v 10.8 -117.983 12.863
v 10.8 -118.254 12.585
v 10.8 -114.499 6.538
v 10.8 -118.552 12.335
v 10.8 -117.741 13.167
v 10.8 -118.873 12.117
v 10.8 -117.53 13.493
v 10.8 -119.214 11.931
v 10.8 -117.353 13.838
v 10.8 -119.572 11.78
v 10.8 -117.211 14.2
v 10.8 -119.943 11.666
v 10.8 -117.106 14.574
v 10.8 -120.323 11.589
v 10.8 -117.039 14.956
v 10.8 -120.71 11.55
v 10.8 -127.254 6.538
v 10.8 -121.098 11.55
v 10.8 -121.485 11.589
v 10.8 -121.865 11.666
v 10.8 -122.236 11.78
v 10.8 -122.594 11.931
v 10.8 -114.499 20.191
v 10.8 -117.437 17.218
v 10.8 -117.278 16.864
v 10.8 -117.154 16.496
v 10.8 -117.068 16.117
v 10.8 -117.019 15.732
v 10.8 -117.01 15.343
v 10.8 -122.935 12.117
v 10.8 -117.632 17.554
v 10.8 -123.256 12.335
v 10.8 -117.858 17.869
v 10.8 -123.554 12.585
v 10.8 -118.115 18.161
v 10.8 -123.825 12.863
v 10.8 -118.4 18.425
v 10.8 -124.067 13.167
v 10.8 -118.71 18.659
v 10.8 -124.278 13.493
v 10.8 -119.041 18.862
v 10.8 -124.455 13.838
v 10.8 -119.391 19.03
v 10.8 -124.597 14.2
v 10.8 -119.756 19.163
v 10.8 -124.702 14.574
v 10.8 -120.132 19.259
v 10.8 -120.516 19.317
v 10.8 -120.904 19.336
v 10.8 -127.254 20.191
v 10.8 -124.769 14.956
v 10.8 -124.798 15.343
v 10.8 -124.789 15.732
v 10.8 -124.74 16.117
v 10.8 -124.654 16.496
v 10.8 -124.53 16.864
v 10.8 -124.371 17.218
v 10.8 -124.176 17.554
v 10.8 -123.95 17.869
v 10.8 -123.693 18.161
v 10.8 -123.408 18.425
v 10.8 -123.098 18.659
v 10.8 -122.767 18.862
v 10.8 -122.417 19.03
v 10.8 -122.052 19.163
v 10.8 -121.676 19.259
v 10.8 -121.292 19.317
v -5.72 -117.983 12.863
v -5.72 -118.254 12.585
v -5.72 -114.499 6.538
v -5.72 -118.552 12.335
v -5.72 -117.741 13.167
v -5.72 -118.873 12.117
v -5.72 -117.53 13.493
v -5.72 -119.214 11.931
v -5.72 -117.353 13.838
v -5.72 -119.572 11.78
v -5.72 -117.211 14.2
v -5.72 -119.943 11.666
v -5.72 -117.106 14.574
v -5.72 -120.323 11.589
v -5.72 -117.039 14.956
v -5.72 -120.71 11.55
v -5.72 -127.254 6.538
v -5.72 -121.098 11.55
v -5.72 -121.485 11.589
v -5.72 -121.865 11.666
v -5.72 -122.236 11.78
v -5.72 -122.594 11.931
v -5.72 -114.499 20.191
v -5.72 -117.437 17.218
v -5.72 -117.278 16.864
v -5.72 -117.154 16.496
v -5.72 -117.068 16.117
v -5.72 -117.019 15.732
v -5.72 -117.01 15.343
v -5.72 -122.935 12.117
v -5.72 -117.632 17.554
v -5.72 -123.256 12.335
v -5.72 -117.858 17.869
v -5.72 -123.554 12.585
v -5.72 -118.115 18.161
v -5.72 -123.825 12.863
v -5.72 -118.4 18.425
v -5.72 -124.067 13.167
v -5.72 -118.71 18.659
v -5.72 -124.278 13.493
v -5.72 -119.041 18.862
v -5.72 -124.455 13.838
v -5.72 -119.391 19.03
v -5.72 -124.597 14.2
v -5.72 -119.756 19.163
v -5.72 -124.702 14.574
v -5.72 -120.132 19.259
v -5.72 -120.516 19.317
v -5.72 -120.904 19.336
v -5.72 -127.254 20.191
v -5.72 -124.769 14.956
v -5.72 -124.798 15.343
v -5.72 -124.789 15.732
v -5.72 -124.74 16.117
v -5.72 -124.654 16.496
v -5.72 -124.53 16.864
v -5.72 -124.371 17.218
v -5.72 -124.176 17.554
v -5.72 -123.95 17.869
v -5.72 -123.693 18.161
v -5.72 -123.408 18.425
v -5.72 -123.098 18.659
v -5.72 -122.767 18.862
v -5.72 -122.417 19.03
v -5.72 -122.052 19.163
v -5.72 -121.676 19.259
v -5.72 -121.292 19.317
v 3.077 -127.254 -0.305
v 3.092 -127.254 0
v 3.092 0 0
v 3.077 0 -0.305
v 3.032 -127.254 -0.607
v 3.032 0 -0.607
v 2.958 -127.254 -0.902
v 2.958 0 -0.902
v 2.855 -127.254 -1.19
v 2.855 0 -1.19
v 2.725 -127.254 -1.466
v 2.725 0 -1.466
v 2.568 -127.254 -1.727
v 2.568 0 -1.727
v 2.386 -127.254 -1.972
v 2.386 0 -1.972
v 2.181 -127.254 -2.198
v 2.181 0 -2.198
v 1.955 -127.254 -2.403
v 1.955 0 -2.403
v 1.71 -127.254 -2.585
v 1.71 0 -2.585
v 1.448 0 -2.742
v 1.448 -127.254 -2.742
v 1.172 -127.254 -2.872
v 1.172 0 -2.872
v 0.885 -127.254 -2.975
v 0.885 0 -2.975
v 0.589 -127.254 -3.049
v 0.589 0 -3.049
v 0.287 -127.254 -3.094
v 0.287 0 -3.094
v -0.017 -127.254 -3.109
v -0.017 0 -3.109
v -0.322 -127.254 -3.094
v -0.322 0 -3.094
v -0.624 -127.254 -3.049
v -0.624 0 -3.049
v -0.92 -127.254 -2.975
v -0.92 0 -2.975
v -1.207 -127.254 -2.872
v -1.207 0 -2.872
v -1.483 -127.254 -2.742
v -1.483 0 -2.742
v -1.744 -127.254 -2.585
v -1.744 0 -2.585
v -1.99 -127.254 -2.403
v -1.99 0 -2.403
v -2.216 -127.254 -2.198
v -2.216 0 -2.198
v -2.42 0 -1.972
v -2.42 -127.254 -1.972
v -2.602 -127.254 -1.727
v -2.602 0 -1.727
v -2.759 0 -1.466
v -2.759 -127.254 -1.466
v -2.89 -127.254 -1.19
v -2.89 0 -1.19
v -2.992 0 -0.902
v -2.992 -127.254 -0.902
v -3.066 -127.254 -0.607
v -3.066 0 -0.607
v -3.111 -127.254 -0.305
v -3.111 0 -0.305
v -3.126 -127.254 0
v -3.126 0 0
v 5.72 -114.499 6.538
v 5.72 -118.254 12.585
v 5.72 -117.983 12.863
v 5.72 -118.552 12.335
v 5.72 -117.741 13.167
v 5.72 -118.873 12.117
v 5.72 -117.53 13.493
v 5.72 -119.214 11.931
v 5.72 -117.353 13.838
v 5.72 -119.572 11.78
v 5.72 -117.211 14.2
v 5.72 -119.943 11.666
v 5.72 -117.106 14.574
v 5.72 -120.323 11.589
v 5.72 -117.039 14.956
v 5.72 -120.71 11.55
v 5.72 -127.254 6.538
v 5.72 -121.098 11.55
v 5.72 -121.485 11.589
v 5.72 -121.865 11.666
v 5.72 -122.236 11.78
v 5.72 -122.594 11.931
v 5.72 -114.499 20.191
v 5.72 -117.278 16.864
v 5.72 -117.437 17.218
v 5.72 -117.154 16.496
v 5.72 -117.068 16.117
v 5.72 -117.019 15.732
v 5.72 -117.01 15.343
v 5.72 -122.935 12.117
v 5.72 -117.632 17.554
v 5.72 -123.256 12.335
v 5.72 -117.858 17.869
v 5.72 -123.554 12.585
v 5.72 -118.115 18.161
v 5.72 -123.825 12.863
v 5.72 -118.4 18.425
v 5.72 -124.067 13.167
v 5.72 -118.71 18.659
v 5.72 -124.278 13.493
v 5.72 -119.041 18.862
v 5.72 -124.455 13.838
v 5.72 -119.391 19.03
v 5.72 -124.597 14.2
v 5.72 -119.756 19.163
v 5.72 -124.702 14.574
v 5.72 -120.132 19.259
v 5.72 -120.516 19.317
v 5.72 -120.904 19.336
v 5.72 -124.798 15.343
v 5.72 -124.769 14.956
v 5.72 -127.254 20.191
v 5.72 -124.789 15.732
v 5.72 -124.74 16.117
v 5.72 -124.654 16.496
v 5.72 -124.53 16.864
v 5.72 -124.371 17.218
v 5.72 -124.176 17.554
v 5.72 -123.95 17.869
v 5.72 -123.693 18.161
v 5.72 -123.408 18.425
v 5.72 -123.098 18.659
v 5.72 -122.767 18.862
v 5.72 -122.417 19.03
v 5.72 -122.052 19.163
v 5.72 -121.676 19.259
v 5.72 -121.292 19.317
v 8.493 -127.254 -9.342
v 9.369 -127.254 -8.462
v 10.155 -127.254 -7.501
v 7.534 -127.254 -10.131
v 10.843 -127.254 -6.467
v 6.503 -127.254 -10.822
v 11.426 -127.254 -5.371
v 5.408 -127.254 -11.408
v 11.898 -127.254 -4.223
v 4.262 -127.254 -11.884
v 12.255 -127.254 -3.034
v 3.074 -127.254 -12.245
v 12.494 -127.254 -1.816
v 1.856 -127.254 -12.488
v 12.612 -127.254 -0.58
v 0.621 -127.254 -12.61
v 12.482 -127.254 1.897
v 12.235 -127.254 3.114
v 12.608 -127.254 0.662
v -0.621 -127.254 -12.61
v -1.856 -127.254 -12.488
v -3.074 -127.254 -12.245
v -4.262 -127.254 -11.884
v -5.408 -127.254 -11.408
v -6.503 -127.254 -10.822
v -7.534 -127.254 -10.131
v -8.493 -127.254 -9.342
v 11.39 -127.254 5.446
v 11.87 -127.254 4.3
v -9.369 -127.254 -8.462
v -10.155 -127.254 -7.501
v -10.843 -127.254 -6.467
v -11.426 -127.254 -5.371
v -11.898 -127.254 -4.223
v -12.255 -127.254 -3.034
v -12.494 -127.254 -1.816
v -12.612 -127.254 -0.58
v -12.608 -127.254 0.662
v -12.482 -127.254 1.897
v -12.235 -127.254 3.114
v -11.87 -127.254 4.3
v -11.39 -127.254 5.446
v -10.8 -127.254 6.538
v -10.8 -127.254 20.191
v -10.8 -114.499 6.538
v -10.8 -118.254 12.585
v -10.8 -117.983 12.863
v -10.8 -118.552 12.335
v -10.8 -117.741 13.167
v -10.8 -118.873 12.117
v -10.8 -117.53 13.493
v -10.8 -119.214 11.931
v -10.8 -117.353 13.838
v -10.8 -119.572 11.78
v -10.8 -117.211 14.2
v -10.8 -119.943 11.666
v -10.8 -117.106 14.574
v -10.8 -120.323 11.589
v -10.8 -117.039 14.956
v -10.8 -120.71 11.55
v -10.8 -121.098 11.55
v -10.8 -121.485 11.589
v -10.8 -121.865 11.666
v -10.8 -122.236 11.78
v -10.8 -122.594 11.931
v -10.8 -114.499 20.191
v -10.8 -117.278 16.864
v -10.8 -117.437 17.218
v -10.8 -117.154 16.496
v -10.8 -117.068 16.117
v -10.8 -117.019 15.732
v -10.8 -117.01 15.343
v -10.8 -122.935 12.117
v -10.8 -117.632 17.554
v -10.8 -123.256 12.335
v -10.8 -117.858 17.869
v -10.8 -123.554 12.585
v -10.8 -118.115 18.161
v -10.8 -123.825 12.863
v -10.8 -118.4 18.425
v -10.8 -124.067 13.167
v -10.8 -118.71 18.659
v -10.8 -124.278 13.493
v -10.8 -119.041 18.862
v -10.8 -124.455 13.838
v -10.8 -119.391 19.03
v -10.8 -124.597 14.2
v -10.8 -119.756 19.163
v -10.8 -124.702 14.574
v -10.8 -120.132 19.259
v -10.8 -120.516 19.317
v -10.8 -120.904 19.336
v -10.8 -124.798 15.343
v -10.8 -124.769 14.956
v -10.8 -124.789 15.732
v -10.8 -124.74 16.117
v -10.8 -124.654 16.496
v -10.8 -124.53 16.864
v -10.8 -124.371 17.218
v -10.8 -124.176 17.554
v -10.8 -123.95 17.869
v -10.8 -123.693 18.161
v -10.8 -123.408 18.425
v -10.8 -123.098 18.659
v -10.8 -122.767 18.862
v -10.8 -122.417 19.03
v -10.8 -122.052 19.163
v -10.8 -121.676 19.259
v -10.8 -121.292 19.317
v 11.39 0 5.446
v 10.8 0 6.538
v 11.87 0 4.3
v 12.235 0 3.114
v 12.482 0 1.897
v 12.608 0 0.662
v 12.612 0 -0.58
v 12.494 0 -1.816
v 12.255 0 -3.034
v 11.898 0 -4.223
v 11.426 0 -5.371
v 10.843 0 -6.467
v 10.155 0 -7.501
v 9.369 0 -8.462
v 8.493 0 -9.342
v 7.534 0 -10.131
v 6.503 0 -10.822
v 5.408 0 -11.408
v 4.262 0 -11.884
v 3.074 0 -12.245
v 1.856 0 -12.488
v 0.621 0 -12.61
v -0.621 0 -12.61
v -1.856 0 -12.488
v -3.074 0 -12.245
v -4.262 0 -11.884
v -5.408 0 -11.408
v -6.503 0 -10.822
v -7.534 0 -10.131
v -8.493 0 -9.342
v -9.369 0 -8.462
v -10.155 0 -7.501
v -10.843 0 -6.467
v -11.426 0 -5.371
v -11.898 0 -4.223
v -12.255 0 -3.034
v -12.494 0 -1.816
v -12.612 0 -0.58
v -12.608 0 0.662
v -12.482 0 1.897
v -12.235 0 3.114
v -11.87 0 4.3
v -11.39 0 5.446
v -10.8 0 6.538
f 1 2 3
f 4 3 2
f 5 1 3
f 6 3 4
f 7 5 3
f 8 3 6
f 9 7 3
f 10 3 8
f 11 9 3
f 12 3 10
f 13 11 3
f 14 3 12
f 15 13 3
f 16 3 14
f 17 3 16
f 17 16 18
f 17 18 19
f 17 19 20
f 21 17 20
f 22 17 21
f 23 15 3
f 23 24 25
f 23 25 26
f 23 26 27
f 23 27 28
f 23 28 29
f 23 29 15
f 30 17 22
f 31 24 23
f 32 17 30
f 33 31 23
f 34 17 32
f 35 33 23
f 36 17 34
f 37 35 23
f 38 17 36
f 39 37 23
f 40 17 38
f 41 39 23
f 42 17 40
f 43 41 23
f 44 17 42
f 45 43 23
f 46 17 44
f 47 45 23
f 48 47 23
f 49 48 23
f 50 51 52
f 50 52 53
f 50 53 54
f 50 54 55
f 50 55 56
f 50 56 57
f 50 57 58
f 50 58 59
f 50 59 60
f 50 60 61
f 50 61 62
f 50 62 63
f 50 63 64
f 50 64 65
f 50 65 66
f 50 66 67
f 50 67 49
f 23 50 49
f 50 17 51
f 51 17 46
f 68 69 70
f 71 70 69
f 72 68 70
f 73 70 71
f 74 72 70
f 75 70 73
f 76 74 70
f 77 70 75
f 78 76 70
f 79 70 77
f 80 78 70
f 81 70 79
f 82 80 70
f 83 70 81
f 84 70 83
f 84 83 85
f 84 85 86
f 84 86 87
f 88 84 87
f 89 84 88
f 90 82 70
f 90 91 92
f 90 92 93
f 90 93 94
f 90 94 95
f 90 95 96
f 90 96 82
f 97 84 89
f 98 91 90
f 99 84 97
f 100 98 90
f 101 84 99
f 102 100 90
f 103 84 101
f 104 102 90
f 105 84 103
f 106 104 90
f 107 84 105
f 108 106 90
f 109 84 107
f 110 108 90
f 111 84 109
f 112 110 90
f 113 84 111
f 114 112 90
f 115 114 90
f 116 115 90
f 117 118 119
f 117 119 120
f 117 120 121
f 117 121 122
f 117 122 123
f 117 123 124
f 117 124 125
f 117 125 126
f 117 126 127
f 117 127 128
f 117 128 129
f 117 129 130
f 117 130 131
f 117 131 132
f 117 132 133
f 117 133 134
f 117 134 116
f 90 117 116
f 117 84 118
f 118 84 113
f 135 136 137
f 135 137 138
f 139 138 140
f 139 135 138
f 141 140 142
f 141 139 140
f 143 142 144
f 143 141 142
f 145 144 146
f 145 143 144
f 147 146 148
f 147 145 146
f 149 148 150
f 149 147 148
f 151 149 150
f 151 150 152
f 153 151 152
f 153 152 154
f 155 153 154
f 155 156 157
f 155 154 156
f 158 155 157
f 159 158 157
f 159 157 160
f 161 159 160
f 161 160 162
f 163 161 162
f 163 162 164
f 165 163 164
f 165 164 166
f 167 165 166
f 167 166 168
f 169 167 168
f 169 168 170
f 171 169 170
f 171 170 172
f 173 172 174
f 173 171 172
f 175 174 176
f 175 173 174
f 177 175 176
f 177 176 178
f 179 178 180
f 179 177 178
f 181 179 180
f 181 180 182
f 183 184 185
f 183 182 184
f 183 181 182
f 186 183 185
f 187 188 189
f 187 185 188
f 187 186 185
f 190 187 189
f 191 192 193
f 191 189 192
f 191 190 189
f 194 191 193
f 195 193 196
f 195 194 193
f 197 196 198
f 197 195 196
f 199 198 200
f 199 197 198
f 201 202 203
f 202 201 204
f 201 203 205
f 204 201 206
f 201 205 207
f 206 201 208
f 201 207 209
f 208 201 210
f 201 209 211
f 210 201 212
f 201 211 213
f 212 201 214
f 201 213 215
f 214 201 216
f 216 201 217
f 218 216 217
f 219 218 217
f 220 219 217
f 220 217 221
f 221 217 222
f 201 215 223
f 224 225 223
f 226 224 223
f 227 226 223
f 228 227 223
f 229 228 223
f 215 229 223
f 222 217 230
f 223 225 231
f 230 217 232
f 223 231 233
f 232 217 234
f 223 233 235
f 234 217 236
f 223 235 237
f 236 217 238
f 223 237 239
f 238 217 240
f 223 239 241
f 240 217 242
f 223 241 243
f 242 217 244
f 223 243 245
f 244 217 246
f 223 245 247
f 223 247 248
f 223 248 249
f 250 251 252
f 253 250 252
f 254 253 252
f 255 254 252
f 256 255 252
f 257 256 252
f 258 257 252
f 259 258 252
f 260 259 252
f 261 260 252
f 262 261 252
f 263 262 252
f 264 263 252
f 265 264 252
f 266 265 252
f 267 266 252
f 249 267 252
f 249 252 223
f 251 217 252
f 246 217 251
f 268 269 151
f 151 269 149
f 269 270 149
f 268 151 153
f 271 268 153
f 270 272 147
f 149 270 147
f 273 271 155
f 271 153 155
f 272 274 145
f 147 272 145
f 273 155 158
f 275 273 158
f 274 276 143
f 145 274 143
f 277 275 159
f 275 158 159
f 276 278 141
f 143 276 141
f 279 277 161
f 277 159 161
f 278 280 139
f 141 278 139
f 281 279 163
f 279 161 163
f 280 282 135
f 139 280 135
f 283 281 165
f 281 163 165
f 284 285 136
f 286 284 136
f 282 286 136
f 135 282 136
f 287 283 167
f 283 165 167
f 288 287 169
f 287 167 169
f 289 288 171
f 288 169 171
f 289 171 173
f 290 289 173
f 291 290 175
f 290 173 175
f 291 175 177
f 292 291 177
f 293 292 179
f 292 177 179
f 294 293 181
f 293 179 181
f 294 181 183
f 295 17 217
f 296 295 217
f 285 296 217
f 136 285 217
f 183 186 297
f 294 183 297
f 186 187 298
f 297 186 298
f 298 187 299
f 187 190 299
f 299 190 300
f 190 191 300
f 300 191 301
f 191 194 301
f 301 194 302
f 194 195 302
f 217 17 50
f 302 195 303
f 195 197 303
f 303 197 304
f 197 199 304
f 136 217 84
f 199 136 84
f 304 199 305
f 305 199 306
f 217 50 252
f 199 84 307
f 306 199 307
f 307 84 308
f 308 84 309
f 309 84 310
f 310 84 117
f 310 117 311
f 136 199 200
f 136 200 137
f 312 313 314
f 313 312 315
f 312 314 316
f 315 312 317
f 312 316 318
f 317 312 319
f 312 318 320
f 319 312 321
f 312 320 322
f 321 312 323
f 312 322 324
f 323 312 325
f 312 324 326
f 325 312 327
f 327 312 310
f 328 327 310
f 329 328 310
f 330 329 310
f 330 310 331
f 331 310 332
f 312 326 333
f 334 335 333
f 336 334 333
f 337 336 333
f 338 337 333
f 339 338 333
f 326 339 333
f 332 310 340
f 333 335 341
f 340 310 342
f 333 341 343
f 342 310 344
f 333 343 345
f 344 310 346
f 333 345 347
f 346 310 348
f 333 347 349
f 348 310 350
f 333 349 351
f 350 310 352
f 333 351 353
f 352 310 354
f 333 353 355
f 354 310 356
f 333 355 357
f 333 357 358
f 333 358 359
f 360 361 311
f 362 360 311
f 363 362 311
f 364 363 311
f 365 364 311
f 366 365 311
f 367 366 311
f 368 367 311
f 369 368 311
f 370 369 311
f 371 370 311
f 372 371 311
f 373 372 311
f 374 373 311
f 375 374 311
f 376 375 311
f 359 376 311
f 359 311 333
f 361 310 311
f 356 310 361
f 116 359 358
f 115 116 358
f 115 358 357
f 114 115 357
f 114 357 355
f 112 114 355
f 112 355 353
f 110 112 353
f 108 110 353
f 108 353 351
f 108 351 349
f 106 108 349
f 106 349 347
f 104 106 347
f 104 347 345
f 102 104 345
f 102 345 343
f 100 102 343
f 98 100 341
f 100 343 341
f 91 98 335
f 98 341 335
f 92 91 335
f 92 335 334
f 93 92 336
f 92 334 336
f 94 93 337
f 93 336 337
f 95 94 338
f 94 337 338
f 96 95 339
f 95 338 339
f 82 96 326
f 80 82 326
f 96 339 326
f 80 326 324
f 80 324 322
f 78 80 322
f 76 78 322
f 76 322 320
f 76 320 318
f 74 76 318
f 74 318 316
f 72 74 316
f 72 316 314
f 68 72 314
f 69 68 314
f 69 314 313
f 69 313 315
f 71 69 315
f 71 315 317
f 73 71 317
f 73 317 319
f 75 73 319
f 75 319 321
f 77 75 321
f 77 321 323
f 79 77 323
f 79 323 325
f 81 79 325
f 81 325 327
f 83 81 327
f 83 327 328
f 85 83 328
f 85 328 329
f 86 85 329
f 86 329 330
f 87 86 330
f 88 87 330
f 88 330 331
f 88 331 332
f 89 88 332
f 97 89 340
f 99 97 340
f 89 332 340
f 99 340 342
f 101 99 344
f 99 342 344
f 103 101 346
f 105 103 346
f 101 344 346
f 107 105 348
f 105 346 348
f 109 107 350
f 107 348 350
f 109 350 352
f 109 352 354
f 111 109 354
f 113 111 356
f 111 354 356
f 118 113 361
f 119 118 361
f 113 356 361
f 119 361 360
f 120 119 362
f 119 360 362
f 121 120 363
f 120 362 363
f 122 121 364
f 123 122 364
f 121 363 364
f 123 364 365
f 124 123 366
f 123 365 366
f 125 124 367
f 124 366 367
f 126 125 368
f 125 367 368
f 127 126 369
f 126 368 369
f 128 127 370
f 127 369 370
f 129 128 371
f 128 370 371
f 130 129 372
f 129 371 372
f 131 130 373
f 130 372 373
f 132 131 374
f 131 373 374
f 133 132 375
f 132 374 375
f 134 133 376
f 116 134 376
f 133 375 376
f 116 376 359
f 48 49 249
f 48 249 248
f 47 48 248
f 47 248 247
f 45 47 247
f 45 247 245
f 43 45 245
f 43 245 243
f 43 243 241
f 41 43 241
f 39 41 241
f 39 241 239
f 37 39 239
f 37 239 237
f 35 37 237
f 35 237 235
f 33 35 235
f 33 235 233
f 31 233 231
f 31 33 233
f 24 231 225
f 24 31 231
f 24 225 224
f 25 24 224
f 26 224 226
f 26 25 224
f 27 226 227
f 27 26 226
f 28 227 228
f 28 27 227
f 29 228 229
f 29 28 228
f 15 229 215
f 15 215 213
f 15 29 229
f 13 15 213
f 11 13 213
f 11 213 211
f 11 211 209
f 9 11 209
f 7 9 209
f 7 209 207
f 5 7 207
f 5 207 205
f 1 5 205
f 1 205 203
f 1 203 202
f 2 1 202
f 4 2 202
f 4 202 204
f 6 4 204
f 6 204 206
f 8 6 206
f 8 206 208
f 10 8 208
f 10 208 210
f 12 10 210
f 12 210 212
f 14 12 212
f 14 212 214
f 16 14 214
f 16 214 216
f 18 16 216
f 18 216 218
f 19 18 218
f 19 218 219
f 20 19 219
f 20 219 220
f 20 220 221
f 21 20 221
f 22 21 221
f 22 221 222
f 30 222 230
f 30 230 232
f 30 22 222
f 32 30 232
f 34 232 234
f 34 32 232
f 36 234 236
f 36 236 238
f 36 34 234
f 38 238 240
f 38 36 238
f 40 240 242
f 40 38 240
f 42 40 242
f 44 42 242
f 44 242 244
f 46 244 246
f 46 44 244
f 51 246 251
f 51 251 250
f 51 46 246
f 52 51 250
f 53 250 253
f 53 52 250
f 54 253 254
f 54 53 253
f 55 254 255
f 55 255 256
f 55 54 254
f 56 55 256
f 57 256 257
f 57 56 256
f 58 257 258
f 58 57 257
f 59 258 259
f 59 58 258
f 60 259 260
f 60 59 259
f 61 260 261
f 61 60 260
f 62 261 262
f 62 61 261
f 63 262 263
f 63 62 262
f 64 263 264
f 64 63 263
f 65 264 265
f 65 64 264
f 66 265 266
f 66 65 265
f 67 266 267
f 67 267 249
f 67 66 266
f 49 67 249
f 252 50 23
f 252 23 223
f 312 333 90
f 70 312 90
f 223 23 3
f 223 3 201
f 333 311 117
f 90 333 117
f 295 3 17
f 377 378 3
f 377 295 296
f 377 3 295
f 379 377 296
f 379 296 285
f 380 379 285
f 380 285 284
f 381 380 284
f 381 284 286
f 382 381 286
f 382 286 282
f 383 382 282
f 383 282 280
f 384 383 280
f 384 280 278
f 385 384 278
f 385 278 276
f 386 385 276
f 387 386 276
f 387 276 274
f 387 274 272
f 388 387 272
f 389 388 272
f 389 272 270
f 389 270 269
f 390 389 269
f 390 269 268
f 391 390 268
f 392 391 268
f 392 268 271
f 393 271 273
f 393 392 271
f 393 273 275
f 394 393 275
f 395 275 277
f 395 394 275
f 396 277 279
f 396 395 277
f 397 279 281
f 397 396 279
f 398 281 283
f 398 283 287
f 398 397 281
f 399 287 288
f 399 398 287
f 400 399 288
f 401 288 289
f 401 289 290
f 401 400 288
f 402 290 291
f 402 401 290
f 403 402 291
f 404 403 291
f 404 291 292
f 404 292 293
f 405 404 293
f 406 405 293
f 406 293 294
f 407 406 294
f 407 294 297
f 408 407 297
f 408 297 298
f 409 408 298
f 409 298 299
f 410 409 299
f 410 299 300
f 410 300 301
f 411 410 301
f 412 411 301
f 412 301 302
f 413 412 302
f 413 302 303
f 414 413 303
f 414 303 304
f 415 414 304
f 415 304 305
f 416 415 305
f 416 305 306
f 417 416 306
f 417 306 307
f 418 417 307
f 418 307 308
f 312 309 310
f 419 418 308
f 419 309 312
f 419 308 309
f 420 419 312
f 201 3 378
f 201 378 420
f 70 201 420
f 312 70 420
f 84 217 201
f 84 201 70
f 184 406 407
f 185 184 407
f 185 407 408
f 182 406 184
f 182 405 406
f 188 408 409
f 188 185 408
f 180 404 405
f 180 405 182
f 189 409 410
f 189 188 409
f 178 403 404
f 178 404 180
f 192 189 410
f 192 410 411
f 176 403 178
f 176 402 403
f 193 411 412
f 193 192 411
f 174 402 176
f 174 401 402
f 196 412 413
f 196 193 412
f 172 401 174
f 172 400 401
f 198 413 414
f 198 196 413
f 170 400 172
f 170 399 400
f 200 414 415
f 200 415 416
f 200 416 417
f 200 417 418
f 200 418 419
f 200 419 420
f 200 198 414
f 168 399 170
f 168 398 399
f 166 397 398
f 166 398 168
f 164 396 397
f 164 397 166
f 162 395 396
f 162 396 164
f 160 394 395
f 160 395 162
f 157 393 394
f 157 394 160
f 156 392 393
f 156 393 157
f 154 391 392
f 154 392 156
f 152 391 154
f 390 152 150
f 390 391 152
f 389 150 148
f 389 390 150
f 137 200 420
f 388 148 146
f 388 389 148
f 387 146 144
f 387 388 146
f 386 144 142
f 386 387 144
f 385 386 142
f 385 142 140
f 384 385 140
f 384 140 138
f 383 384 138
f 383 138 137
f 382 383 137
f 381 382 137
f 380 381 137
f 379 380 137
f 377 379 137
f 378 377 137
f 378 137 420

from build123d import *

# Parameters (mm, degrees)
SKETCH1_R           = 12.62515314
BOSS_EXTRUDE1_DEPTH = 127.254
SKETCH2_W           = 21.600890372
SKETCH2_H           = 6.08719661
CUT_EXTRUDE1_DEPTH  = 155.702
CUT_EXTRUDE2_DEPTH  = 141.081655767
SKETCH4_W           = 5.08
SKETCH4_H           = 13.653478909
BOSS_EXTRUDE2_DEPTH = 12.755190121
CUT_EXTRUDE3_REACH  = 132.958
SKETCH15_R          = 3.895516075


with BuildPart() as part:
    # Sketch1 → Boss-Extrude1 (new body)
    with BuildSketch(Plane(origin=(0, 0, 0), x_dir=(1, 0, 0), z_dir=(0, 1, 0))):
        with Locations(Location((0, 0, 0), (0, 0, 270))):
            Circle(SKETCH1_R)
    extrude(amount=-BOSS_EXTRUDE1_DEPTH)

    # Sketch2 → Cut-Extrude1 (cut)
    with BuildSketch(Plane(origin=(0, -127.254, 0), x_dir=(-1, 0, 0), z_dir=(0, -1, 0))):
        with Locations((0, -9.581554835)):
            Rectangle(SKETCH2_W, SKETCH2_H)
    extrude(amount=-CUT_EXTRUDE1_DEPTH, mode=Mode.SUBTRACT)

    # Sketch3 → Cut-Extrude2 (cut)
    with BuildSketch(Plane(origin=(0, -127.254, 0), x_dir=(-1, 0, 0), z_dir=(0, -1, 0))):
        with BuildLine():
            Line((3.126169088, 0), (-3.091625783, 0))
            ThreePointArc((-3.091625783, 0), (0.017271652, 3.108897435), (3.126169088, 0))
        make_face()
    extrude(amount=-CUT_EXTRUDE2_DEPTH, mode=Mode.SUBTRACT)

    # Sketch4 → Boss-Extrude2 (add)
    with BuildSketch(Plane.XZ.offset(127.254)):
        with Locations((-8.260445186, 13.364695985)):
            Rectangle(SKETCH4_W, SKETCH4_H)
    boss_extrude2 = extrude(amount=-BOSS_EXTRUDE2_DEPTH)

    # Sketch15 → Cut-Extrude3 (cut, up to next)
    with BuildSketch(Plane.ZY.offset(10.800445186), mode=Mode.PRIVATE) as cut_extrude3_sk1:
        with Locations((15.440577286, -120.904)):
            Circle(SKETCH15_R)
    cut_extrude3_tool1 = extrude(cut_extrude3_sk1.sketch, amount=-CUT_EXTRUDE3_REACH, mode=Mode.PRIVATE) & part.part
    cut_extrude3 = cut_extrude3_tool1.solids().sort_by_distance((-10.800445, -120.904, 15.440577))[0]
    add(cut_extrude3, mode=Mode.SUBTRACT)

    # Mirror2: Boss-Extrude2, Cut-Extrude3 across plane
    add(boss_extrude2.mirror(Plane(origin=(0, 0, 0), x_dir=(0, 0, 1), z_dir=(1, 0, 0))))
    add(cut_extrude3.mirror(Plane(origin=(0, 0, 0), x_dir=(0, 0, 1), z_dir=(1, 0, 0))), mode=Mode.SUBTRACT)


solid = part.part
